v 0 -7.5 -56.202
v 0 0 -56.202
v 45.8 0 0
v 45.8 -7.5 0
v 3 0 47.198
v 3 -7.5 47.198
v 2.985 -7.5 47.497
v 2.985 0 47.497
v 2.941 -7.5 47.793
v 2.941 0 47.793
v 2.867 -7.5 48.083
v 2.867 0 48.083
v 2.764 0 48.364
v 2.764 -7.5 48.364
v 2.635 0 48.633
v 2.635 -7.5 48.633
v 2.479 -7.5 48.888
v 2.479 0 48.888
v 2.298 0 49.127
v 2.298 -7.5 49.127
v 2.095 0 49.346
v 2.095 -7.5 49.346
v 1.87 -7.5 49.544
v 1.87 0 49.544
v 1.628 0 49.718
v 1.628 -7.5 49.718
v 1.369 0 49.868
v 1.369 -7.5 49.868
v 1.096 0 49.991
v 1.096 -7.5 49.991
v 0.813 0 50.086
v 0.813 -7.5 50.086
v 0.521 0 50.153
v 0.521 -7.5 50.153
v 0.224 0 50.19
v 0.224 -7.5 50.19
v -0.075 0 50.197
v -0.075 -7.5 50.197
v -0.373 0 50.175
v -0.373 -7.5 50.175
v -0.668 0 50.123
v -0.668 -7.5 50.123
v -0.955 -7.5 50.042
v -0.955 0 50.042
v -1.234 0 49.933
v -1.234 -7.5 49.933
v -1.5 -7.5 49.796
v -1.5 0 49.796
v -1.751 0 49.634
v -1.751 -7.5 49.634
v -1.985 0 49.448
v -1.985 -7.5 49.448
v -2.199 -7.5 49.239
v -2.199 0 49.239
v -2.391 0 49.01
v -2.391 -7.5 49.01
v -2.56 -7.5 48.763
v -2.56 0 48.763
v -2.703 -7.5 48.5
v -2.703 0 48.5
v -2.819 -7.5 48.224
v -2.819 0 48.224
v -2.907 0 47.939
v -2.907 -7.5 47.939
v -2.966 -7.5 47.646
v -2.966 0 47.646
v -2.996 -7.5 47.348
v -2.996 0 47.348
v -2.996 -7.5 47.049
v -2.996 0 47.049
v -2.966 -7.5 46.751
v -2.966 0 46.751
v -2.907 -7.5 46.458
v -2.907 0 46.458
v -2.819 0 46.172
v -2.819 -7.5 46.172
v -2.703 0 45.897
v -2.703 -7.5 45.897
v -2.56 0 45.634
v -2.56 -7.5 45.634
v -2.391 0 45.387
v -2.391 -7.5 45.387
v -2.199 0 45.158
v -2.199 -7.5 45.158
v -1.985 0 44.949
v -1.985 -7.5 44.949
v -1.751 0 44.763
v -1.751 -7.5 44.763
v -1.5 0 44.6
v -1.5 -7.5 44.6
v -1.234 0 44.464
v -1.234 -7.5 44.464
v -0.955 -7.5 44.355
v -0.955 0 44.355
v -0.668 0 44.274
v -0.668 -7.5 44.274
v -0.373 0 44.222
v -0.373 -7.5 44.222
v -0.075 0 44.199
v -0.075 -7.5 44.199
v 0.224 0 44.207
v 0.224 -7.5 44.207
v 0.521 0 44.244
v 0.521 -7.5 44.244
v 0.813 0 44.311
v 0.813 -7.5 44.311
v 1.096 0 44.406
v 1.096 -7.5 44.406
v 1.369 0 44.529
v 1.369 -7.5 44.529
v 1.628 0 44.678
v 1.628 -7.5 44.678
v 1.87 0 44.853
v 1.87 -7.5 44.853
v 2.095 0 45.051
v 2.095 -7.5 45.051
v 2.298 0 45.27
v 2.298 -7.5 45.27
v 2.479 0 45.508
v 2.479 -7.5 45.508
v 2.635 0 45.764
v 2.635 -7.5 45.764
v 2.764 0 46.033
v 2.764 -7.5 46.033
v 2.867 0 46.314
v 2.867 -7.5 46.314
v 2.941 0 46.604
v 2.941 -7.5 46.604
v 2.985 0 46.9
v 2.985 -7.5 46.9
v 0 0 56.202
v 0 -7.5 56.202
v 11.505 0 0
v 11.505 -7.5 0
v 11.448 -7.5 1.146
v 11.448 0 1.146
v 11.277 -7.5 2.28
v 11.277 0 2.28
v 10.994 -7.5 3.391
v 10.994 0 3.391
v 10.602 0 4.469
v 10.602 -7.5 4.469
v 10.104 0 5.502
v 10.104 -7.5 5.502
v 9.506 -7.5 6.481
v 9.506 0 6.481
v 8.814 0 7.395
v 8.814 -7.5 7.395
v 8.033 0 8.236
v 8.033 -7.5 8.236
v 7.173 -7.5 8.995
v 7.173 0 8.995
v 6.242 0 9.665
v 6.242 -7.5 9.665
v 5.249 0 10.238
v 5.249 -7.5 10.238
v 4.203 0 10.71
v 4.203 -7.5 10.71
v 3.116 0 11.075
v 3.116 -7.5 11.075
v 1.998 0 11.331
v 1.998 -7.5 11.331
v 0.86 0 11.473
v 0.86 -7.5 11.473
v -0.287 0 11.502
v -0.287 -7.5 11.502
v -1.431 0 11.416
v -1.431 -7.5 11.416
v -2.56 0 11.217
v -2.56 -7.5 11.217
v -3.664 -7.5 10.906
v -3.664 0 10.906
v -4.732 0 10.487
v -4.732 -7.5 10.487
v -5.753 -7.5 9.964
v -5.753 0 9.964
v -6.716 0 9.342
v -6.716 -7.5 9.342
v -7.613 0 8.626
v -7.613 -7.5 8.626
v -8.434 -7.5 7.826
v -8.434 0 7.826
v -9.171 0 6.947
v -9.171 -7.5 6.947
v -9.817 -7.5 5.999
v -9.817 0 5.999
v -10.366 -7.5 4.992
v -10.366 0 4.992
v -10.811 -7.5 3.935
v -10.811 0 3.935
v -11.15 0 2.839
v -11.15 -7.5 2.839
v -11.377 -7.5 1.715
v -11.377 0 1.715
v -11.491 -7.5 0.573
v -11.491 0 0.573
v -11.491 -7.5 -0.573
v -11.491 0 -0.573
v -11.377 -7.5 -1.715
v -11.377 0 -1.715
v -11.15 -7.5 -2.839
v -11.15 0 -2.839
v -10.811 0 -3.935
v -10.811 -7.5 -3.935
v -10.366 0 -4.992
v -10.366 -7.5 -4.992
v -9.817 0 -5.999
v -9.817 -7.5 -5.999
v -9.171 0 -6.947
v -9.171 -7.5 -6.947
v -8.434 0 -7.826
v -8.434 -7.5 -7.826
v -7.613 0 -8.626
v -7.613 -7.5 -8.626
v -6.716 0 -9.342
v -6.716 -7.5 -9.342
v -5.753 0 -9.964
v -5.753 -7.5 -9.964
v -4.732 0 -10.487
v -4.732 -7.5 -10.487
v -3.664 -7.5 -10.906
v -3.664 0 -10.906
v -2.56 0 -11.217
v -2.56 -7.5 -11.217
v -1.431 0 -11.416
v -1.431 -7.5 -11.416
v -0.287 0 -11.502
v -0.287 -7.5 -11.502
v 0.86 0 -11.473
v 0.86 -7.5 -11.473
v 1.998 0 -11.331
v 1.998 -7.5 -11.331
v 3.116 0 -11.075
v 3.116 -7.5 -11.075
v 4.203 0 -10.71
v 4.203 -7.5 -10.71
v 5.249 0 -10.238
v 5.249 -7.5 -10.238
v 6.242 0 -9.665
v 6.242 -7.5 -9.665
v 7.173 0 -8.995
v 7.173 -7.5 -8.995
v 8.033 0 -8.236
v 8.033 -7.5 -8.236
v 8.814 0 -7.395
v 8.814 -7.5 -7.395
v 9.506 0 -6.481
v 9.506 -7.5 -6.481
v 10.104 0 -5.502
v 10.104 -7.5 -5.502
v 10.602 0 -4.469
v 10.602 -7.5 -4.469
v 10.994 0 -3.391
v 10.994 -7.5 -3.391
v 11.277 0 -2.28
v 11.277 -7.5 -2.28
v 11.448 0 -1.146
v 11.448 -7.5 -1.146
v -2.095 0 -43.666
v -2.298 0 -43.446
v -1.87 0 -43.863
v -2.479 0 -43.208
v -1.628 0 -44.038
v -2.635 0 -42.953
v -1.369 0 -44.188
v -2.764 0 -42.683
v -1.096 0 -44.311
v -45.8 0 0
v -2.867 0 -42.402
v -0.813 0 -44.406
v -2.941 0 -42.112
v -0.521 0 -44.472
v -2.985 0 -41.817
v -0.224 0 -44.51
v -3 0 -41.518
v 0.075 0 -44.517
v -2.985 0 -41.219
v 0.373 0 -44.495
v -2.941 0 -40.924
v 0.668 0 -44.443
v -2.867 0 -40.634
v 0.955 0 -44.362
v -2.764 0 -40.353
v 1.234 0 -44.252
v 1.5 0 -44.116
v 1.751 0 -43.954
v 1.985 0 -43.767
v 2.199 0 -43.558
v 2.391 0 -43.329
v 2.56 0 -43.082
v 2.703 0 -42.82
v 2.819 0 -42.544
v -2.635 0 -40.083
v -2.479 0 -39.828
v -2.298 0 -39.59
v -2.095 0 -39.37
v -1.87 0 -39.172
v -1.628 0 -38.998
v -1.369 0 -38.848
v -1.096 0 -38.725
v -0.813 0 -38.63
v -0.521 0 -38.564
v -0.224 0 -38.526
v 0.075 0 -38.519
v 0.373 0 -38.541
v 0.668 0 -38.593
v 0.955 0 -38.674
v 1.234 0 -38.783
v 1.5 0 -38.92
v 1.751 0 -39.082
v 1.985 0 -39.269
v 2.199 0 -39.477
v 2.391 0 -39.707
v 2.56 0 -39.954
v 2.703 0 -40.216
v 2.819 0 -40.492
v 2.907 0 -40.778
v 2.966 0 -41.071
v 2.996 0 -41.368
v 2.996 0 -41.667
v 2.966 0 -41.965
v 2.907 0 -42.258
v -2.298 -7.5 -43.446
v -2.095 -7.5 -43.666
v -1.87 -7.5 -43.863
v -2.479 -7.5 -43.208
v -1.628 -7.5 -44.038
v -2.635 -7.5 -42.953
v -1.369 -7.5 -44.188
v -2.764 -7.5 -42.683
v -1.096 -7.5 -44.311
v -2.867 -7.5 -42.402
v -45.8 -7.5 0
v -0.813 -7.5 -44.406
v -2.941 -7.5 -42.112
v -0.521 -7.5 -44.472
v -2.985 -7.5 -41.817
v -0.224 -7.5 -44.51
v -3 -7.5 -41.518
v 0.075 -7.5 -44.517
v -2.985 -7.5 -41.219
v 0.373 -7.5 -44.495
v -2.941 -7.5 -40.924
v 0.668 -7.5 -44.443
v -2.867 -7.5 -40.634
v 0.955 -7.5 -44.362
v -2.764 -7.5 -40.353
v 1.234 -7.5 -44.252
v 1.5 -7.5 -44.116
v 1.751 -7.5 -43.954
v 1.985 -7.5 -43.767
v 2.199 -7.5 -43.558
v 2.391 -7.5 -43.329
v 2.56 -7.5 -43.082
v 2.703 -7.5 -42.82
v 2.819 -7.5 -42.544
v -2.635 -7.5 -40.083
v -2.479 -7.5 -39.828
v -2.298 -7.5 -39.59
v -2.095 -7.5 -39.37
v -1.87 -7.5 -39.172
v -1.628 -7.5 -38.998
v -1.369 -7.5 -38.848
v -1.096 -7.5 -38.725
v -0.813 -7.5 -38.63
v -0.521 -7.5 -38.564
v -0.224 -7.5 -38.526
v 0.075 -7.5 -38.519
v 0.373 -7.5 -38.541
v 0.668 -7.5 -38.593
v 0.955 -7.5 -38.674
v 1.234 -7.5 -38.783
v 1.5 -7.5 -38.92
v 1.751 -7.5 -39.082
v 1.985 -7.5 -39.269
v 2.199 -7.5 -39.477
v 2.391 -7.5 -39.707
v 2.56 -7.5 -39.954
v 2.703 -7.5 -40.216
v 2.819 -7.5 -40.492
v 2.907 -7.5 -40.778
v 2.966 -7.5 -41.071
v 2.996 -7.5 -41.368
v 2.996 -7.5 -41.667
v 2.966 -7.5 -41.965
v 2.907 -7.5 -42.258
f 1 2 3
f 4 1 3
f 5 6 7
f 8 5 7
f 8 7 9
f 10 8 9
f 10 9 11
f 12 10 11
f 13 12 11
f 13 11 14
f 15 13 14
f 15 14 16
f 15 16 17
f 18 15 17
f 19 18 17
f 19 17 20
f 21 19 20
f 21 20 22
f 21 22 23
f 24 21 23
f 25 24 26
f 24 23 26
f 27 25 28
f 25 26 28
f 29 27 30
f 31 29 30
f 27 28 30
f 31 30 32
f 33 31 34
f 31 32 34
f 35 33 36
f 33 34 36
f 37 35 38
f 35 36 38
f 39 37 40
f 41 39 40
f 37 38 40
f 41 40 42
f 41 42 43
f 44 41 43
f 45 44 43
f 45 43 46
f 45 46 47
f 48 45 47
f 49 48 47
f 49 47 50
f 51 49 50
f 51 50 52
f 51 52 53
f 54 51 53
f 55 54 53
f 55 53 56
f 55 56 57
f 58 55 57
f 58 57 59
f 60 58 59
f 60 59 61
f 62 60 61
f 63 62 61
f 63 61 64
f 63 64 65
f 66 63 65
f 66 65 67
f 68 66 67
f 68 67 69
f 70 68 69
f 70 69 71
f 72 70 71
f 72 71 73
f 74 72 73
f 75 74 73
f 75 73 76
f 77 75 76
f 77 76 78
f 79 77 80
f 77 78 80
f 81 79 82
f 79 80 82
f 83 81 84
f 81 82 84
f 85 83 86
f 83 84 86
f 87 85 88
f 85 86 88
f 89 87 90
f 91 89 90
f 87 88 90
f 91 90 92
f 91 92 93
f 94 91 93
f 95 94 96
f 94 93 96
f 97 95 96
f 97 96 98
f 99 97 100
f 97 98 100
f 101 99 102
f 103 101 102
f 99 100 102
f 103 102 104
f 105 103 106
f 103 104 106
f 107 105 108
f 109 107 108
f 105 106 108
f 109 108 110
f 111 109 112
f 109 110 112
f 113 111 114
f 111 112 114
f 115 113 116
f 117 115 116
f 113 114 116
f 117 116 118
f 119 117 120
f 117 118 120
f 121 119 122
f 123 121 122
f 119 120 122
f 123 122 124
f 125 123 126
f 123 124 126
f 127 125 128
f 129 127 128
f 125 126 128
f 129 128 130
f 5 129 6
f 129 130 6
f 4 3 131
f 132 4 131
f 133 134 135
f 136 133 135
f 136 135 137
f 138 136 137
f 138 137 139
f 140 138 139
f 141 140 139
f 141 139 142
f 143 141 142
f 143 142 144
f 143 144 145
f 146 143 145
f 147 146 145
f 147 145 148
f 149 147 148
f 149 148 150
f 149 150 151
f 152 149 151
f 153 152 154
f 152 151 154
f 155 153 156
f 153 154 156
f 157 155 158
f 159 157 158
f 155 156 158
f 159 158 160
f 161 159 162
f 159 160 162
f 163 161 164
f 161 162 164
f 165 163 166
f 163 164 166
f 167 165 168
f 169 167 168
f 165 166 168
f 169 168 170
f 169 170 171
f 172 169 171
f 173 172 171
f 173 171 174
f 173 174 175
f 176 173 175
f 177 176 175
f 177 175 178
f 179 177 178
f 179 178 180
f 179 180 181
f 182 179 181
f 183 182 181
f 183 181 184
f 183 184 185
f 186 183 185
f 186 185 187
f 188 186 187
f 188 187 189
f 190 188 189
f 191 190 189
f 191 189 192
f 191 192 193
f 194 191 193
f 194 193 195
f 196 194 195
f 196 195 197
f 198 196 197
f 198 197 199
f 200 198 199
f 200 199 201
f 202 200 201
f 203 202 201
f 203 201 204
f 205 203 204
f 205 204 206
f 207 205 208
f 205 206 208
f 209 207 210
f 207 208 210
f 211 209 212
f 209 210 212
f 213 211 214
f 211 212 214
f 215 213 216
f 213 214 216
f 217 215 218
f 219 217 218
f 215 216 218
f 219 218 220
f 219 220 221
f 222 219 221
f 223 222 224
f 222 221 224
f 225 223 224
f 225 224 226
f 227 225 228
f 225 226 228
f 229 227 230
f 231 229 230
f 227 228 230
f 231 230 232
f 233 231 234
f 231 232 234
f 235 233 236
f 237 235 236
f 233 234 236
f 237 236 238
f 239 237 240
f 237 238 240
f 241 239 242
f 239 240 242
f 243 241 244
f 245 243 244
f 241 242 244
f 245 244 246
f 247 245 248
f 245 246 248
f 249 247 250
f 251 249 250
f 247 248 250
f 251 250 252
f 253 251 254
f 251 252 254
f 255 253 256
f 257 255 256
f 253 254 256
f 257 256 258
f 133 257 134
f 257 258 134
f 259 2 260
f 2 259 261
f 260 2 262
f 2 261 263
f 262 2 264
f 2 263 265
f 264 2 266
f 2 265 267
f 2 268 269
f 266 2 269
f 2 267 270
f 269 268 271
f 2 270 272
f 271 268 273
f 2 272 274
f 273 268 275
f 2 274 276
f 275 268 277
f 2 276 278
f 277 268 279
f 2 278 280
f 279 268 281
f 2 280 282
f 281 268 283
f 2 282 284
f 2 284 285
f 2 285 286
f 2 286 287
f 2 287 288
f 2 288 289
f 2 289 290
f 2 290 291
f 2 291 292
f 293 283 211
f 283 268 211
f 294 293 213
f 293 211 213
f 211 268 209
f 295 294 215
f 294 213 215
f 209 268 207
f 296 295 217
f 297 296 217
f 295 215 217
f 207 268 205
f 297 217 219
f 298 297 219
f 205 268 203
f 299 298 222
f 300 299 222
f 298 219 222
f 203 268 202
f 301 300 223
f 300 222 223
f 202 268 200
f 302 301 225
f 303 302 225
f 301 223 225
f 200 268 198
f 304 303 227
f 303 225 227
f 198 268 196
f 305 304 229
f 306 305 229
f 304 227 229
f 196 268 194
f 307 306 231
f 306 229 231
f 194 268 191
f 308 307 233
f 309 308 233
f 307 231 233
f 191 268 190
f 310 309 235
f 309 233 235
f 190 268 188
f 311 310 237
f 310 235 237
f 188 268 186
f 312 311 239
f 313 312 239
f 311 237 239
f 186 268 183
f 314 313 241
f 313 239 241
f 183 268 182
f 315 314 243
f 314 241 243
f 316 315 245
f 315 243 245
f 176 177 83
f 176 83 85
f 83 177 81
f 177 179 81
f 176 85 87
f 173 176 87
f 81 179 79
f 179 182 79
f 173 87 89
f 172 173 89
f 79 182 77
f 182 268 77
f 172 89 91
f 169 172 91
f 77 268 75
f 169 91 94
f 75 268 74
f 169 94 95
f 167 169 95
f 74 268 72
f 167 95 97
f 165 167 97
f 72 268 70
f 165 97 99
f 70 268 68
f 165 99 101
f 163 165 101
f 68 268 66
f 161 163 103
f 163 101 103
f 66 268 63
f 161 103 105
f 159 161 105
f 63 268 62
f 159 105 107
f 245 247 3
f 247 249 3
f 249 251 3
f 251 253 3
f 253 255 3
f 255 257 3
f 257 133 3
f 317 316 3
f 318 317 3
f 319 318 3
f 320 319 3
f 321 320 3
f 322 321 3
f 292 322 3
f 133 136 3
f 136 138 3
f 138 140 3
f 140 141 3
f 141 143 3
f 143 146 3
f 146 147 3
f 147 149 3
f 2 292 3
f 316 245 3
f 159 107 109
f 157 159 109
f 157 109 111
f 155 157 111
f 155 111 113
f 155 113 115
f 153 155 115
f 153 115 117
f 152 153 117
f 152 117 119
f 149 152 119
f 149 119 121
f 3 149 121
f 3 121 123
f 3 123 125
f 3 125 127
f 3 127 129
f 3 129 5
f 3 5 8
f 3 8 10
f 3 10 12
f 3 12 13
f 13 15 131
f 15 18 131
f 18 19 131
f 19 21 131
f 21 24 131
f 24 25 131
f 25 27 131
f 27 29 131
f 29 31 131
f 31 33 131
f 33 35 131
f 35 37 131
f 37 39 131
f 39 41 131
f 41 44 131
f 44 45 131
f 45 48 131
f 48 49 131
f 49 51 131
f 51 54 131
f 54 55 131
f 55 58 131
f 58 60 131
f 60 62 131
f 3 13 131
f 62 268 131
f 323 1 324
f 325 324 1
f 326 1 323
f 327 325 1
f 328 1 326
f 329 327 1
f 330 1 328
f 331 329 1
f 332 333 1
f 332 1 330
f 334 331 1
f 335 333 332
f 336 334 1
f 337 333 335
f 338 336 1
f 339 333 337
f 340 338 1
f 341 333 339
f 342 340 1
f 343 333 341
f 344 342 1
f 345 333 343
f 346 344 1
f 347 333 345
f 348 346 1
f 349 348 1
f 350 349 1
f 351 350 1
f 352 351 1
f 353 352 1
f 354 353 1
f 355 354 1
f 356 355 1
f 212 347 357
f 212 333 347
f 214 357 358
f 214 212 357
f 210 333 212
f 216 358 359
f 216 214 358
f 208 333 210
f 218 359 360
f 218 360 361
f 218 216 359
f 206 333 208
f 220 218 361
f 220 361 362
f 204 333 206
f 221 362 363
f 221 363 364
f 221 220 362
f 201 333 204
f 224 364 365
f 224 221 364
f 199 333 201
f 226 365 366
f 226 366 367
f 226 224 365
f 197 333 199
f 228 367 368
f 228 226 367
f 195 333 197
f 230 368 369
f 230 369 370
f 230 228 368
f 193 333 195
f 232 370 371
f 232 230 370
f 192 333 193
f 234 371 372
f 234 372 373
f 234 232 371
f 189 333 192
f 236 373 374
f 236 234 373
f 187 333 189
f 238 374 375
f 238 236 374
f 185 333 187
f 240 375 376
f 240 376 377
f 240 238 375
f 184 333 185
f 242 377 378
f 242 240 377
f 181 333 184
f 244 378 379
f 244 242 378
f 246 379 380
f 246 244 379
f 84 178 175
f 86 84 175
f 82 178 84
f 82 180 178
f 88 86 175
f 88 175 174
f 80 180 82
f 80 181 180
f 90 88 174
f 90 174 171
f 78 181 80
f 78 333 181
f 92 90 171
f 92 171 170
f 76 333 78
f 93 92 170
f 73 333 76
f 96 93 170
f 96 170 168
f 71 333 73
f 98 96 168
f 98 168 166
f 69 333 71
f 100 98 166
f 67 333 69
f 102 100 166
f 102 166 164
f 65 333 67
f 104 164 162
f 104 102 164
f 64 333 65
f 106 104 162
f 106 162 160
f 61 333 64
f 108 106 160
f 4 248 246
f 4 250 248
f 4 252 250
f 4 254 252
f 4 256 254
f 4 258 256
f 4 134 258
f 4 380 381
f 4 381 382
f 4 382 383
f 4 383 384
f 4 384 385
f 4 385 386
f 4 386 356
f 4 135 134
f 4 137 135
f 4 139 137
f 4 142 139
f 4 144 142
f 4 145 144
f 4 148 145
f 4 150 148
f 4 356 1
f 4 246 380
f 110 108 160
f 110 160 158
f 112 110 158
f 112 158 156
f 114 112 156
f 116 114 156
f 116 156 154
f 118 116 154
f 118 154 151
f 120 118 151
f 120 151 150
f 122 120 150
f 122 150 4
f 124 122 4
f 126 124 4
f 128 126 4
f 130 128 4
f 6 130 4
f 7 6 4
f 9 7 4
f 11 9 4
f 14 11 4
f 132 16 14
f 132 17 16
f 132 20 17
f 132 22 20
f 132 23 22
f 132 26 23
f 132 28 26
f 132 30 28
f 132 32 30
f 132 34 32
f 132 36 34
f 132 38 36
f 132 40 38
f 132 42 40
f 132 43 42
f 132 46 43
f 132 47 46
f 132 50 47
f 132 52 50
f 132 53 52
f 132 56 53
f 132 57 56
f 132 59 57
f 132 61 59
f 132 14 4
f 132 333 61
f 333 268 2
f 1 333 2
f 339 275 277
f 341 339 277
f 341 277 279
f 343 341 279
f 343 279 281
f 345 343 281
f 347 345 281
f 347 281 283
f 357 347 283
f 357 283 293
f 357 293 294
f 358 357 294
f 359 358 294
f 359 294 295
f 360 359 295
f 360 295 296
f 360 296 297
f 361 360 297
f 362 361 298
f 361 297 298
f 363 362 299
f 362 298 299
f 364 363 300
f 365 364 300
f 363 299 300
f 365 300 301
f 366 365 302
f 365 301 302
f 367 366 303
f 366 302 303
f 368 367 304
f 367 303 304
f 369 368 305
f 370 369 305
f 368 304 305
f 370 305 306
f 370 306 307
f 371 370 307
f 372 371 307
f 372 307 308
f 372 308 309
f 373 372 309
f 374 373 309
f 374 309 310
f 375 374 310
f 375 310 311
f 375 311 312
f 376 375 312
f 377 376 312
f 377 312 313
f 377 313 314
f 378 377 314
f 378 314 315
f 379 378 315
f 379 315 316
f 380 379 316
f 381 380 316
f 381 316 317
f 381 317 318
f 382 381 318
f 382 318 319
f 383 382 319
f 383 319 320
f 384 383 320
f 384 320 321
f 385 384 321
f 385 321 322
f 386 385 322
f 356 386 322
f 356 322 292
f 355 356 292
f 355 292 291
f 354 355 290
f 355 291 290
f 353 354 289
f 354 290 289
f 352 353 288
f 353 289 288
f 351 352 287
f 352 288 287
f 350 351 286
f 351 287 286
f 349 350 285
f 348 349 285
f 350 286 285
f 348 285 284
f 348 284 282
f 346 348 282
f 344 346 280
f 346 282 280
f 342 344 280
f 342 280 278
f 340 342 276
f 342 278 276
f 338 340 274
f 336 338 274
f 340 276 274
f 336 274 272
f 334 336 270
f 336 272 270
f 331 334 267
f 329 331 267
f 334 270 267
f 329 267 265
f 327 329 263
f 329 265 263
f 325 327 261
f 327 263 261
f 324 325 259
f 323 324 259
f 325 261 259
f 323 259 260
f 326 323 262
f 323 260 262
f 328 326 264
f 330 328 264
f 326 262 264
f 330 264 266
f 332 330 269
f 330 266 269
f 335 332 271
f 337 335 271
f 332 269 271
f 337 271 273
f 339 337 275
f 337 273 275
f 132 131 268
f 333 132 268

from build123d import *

# Parameters (mm, degrees)
F1_DEPTH = 7.5
F2_R     = 11.50533
F3_DEPTH = 25
F4_R     = 3
F5_DEPTH = 25
F6_R     = 3
F7_DEPTH = 25


with BuildPart() as f1:
    # F0 (on Front) → F1 (new body)
    with BuildSketch(Plane.XZ):
        Polygon((45.799506, 0), (0, 56.201915), (-45.799506, 0), (0, -56.201915), align=None)
    extrude(amount=F1_DEPTH)

    # F2 (on face) → F3 (cut)
    with BuildSketch(Plane.XZ.offset(7.5)):
        Circle(F2_R)
    extrude(amount=-F3_DEPTH, mode=Mode.SUBTRACT)

    # F4 (on face) → F5 (cut)
    with BuildSketch(Plane.XZ.offset(7.5)):
        with Locations((0, 47.198402)):
            Circle(F4_R)
    extrude(amount=-F5_DEPTH, mode=Mode.SUBTRACT)

    # F6 (on face) → F7 (cut)
    with BuildSketch(Plane(origin=(0, 0, 0), x_dir=(-1, 0, 0), z_dir=(0, 1, 0))):
        with Locations((0, -41.517954)):
            Circle(F6_R)
    extrude(amount=-F7_DEPTH, mode=Mode.SUBTRACT)


solid = f1.part
